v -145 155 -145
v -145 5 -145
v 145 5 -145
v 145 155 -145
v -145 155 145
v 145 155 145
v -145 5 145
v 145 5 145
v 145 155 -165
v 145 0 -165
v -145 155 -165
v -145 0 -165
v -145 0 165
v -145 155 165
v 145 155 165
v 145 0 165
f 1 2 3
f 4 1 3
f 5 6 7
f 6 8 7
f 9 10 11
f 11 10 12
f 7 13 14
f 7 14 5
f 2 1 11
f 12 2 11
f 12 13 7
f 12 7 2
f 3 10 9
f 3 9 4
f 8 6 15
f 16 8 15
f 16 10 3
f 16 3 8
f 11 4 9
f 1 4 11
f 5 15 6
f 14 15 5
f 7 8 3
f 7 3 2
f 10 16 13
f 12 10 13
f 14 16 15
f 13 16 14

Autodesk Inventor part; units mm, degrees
ref_plane "YZ Plane" through (0, 0, 0) normal (1, 0, 0) x (0, 1, 0)
ref_plane "XZ Plane" through (0, 0, 0) normal (0, 1, 0) x (-1, 0, 0)
ref_plane "XY Plane" through (0, 0, 0) normal (0, 0, 1) x (1, 0, 0)
sketch "Эскиз1" plane through (0, 0, 0) normal (0, 1, 0) x (-1, 0, 0)
  line L0 (-145, 145) -> (145, 145)
  line L1 (145, 145) -> (145, -145)
  line L2 (145, -145) -> (-145, -145)
  line L3 (-145, -145) -> (-145, 145)
  line L4 (145, 0) -> (-145, 0) construction
  line L5 (0, 145) -> (0, -145) construction
  line L6 (145, 145) -> (-145, 145)
  line L7 (-145, 145) -> (-145, 165)
  line L8 (-145, 165) -> (145, 165)
  line L9 (145, 165) -> (145, 145)
  line L10 (145, -145) -> (-145, -145)
  line L11 (-145, -145) -> (-145, -165)
  line L12 (-145, -165) -> (145, -165)
  line L13 (145, -165) -> (145, -145)
  point P0 (0, 0)
  point P1 (0, 0)
  dimension "d0" = 290
  dimension "d1" = 290
  dimension "d2" = 290
  dimension "d3" = 20
  dimension "d4" = 290
  dimension "d5" = 20
extrude "Выдавливание1" add sketch "Эскиз1" along normal blind 5 contours L0 L1 L2 L3
extrude "Выдавливание2" add sketch "Эскиз1" along normal blind 155 contours L7 L8 L9 L0 | L2 L13 L12 L11
sketch "Эскиз2" plane through (145, 5, 145) normal (0, 0, -1) x (-1, 0, 0)
  line L0 (0, -5) -> (0, 150) projected
  line L1 (0, -5) -> (290, -5)
  line L2 (290, -5) -> (290, 0)
  line L3 (290, 0) -> (0, 0)
  line L4 (0, 0) -> (0, -5)
  line L5 (145, 0) -> (145, 150) construction
  line L6 (290, 150) -> (0, 150) projected
  line L7 (145, 0) -> (145, 70) construction
  line L8 (145, 0) -> (145, 20) construction
  line L9 (145, 20) -> (0, 20)
  line L10 (0, 20) -> (0, 120)
  line L11 (0, 120) -> (145, 120)
  line L12 (145, 120) -> (145, 20)
  line L13 (145, 20) -> (290, 20)
  line L14 (290, 20) -> (290, 120)
  line L15 (290, 120) -> (145, 120)
  line L16 (145, 120) -> (145, 20)
  point P0 (145, -5)
  dimension "d10" = 290
  dimension "d11" = 5
  dimension "d12" = 70
  dimension "d13" = 20
  dimension "d14" = 145
  dimension "d15" = 100
  dimension "d16" = 145
  dimension "d17" = 100
properties part number "maze_test_course"
